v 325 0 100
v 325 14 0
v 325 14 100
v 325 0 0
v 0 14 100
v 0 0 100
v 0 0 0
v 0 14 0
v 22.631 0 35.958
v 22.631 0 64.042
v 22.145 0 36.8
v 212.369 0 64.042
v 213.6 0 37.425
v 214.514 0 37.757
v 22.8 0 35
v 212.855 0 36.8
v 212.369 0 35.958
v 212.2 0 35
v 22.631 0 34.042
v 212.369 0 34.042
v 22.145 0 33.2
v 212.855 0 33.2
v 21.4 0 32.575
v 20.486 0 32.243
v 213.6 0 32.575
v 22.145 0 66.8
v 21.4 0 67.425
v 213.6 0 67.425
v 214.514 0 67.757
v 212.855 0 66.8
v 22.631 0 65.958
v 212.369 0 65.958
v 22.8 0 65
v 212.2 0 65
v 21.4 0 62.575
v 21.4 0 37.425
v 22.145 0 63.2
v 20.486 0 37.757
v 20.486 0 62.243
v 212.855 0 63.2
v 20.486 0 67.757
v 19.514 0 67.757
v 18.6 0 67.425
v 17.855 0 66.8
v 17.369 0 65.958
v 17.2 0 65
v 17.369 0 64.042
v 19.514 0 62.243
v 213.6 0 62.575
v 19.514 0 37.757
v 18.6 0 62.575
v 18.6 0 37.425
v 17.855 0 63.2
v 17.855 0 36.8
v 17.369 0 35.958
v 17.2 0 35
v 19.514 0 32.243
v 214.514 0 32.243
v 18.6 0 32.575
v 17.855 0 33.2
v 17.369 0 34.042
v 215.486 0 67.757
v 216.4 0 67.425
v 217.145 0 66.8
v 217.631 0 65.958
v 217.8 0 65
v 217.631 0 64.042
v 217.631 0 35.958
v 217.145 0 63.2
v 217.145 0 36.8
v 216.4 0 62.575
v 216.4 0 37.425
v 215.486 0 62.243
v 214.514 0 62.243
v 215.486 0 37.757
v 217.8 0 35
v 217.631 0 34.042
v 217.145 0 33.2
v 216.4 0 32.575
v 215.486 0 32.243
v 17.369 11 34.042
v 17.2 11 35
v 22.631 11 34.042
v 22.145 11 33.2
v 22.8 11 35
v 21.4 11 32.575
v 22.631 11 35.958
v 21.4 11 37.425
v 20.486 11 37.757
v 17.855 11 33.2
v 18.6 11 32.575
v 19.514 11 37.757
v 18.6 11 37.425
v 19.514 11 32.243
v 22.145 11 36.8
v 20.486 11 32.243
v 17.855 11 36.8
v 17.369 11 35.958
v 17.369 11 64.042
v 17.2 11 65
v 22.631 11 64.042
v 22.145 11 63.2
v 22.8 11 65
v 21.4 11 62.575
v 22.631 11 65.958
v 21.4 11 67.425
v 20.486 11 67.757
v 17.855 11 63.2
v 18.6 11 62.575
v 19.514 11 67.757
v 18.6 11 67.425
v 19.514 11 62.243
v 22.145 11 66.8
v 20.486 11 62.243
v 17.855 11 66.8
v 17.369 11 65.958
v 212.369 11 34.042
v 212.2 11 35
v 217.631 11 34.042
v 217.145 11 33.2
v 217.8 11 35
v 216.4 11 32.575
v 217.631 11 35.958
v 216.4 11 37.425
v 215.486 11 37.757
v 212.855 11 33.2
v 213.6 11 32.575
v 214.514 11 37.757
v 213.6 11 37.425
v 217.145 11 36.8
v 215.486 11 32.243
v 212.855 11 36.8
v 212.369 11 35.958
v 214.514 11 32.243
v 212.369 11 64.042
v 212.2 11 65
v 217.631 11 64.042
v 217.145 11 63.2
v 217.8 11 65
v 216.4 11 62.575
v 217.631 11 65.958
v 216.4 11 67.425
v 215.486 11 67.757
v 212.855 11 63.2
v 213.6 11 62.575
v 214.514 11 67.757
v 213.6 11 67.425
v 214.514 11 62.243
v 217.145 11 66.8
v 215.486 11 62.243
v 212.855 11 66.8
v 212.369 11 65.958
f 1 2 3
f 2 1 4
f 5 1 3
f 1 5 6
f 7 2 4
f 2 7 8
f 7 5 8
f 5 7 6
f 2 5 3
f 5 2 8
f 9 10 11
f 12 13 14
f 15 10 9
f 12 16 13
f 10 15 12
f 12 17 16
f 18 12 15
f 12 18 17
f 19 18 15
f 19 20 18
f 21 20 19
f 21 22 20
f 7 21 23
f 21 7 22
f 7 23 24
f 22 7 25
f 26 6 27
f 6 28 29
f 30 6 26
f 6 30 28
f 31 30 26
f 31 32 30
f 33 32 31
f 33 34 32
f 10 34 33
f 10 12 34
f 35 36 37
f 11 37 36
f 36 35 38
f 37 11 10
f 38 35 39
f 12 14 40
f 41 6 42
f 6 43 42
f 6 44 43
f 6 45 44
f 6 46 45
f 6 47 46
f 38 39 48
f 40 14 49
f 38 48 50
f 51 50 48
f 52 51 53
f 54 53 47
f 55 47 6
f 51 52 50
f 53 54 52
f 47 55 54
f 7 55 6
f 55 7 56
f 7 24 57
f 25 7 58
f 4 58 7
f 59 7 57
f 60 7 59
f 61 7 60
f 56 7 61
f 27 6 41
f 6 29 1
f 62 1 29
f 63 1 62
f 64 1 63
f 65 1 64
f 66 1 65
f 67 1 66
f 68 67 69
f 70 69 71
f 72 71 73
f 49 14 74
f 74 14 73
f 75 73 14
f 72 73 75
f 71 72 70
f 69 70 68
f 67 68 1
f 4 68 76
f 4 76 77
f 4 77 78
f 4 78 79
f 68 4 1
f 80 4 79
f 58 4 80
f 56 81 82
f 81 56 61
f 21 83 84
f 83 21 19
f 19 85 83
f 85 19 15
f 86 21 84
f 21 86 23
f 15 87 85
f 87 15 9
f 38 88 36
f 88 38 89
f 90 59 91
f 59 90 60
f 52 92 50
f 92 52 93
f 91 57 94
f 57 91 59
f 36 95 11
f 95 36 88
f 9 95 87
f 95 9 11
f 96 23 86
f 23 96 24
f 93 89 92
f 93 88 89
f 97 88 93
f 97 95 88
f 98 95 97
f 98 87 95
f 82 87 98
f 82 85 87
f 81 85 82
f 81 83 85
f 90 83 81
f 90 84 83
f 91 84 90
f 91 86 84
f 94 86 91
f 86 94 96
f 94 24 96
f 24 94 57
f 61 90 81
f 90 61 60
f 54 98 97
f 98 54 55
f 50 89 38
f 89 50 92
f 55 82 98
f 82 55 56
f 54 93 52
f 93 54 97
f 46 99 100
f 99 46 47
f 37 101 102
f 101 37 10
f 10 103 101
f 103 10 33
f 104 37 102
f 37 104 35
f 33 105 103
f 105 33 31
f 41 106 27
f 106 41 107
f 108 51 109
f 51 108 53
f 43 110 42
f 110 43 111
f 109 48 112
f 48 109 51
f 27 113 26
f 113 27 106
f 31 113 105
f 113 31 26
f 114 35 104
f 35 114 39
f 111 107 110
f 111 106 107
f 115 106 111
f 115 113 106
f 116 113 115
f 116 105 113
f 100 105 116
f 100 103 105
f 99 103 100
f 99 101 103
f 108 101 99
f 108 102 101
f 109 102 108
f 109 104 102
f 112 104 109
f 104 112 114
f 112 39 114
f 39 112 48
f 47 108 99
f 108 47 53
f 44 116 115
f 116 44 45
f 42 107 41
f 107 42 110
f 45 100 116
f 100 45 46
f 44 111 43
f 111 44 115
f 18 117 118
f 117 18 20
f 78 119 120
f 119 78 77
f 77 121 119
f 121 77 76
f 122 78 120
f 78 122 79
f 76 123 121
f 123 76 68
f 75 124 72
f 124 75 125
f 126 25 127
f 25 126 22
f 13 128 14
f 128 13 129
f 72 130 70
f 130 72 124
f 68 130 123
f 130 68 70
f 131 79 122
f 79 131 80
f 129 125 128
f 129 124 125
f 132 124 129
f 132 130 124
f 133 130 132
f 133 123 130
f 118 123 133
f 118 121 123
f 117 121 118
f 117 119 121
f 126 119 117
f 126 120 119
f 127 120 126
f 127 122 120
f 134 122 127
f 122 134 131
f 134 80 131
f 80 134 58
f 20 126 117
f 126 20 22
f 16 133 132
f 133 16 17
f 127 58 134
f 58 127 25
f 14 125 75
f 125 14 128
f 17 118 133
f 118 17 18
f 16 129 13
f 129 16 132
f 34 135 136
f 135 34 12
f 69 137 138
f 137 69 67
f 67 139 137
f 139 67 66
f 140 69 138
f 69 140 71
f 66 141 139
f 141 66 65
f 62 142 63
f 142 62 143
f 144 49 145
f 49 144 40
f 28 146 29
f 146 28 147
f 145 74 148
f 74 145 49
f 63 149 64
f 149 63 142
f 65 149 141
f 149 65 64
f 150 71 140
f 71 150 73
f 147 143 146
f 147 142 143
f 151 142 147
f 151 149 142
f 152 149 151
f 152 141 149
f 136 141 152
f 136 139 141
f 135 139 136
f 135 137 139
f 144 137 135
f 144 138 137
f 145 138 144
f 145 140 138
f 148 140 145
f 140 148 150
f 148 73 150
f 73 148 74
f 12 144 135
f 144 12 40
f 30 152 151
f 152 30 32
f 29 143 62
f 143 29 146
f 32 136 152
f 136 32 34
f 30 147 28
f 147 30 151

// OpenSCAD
// file: mount_ring_module.scad
// rodi-stand/mount_ring_module.scad
// Shared RO/DI mount ring modules.

module wedge() {
  wedge_radius = mount_ring_outer_diameter + 1;
  rotate([0, 0, -90 - mount_opening_angle / 2])
  translate([0, 0, -1])
    linear_extrude(height = mount_ring_height + 2) {
      polygon(points = [
        [0, 0],
        [wedge_radius, 0],
        [cos(mount_opening_angle) * wedge_radius, sin(mount_opening_angle) * wedge_radius]
      ]);
    }
}

module screw_cutout() {
  translate([0, 0, mount_ring_height / 2])
  rotate([-90, 0, 0])
  union() {
    cylinder(mount_ring_inner_diameter / 2 + mount_surface_extension + 1, screw_hole_diameter / 2, screw_hole_diameter / 2);
    cylinder(mount_ring_inner_diameter / 2 + mount_surface_extension - screw_wall_width, screw_access_diameter / 2, screw_access_diameter / 2);
  }
}

module mount_ring() {
  difference() {
    union() {
      translate([-mount_surface_width / 2, 0, 0])
        cube([mount_surface_width, mount_ring_inner_diameter / 2 + mount_surface_extension, mount_ring_height]);
      cylinder(mount_ring_height, mount_ring_outer_diameter / 2, mount_ring_outer_diameter / 2);
    };
    translate([0, 0, -1])
      cylinder(mount_ring_height + 2, mount_ring_inner_diameter / 2, mount_ring_inner_diameter / 2);
    wedge();
    translate([screw_spacing / 2, 0, 0])
      screw_cutout();
    translate([-screw_spacing / 2, 0, 0])
      screw_cutout();
  }
}
// main file
// RO/DI Water Filter Stand
// Designed for 3D printing on a 256x256x256 mm build plate

use <mount_ring_module.scad>;

// ---------- Public parameters (mm) ----------
// Base dimensions (full build plate).
base_width = 250;
base_depth = 250;
base_thickness = 15;
base_front_corner_cut = 25;
base_back_corner_cut = 50;

// Mounting surface dimensions (shared by stand and mount plates).
mount_width = 100; // Width of the mounting surface.
mount_height = 200; // Height of mounting surface (adjustable).
base_glueing_surface_thickness = 6; // Thickness of mounting surface on the base.

// Screw parameters (shared by mount ring and mount plates).
screw_spacing = 30; // Horizontal spacing between screw holes.

// Stand positioning.
stand_offset_from_back = 40; // Distance from back edge of base.
stand_position_x = base_width / 2; // Center of base width-wise.

// Honeycomb pattern parameters.
honeycomb_width = 34;
honeycomb_margin = 40; // Margin from front and side edges of base.
honeycomb_back_margin = 80; // Distance from back edge - keeps back solid for stand mounting.

// Reinforcement gusset dimensions (optional - set to 0 to disable).
gusset_depth = 40; // Forward extension from mounting surface.
gusset_thickness = 6; // Thickness of gussets.
top_surface_angle = 45; // Angle of the top surface in degrees (0 = flat, positive = angled back).

// Mount ring parameters.
mount_ring_outer_diameter = 68;
mount_ring_inner_diameter = 60.5;
mount_ring_height = 20;
mount_surface_width = 65;
mount_surface_extension = 20;
mount_opening_angle = 120;
screw_wall_width = 12;
screw_hole_diameter = 4.5; // Mount ring screw hole diameter.
screw_access_diameter = 10;

// ---------- Resolution ----------
$fa = 1;
$fs = 1;

// ---------- Derived ----------
honeycomb_radius = (honeycomb_width / 2) / cos(30); // Radius of each hexagon (circumradius - distance from center to vertex).

// Calculate stand position.
stand_x = stand_position_x;
stand_y = base_depth - stand_offset_from_back - base_glueing_surface_thickness / 2;

module hexagon(radius) {
    // Create a regular hexagon
    // radius is the distance from center to vertex
    rotate([0, 0, 30])
    linear_extrude(height = base_thickness + 1) {
        circle(radius, $fn = 6);
    }
}

module honeycomb_pattern() {
    // Generate a tight honeycomb pattern where hexagons touch (like infill)
    // Hexagons are offset in alternating rows for true honeycomb pattern
    // For touching hexagons: horizontal spacing = radius * sqrt(3), vertical = radius * 1.5
    hex_apothem = honeycomb_radius * sqrt(3) / 2; // Distance from center to edge
    hex_horizontal_spacing = honeycomb_radius * sqrt(3); // Center-to-center horizontal (same row)
    hex_vertical_spacing = honeycomb_radius * 1.5; // Center-to-center vertical (adjacent rows)
    hex_row_offset = honeycomb_radius * sqrt(3) / 2; // Horizontal offset for alternating rows
    
    // Calculate pattern area (only front portion, not near back where stand mounts)
    pattern_width = base_width - 2 * honeycomb_margin;
    pattern_depth = base_depth - honeycomb_margin - honeycomb_back_margin; // Only front portion
    
    // Calculate how many hexagons fit
    num_cols = floor(pattern_width / hex_horizontal_spacing) + 2; // Extra columns for offset rows
    num_rows = floor(pattern_depth / hex_vertical_spacing) + 1;
    
    // Start position (front and centered)
    start_x = honeycomb_margin;
    start_y = honeycomb_margin;
    
    // Generate hexagons in honeycomb pattern (only in front area)
    for (row = [0 : num_rows - 1]) {
        y_pos = start_y + row * hex_vertical_spacing;
        // Only generate rows that are in the front area
        if (y_pos <= base_depth - honeycomb_back_margin) {
            // Offset every other row for honeycomb pattern
            x_offset = (row % 2 == 0) ? 0 : hex_row_offset;
            for (col = [0 : num_cols - 1]) {
                x_pos = start_x + col * hex_horizontal_spacing + x_offset;
                // Only create hexagon if it's within the horizontal bounds
                if (x_pos >= honeycomb_margin && x_pos <= base_width - honeycomb_margin) {
                    translate([x_pos, y_pos, -0.5])
                        hexagon(honeycomb_radius * 0.8);
                }
            }
        }
    }
}

module base() {
    // Base as a full square with honeycomb pattern cut from the middle
    difference() {
        // Full square base as extruded polygon (ready for rounded corners later)
        linear_extrude(height = base_thickness) {
            polygon(points = [
                [0, base_front_corner_cut], // Front left corner
                [base_front_corner_cut, 0],  // Front left corner
                [base_width - base_front_corner_cut, 0],              // Front right corner
                [base_width, base_front_corner_cut],              // Front right corner
                [base_width, base_depth - base_back_corner_cut],     // Back right corner
                [base_width - base_back_corner_cut, base_depth],     // Back right corner
                [base_back_corner_cut, base_depth],              // Back left corner
                [0, base_depth - base_back_corner_cut]              // Back left corner
            ]);
        }
        
        // Cut honeycomb pattern from the middle
        honeycomb_pattern();
    }
}

module angled_top_cut() {
    // Cut angled top surface using a rotated cube
    // Create cube, rotate around X axis, then translate along Z axis
    translate([0, -base_glueing_surface_thickness / 2, mount_height])
        rotate([-top_surface_angle, 0, 0])
            translate([-mount_width, -gusset_depth, 0])
                cube([mount_width * 2, gusset_depth * 3, gusset_depth * 3]);
}

module mounting_stand() {
    // Create the gluing surface and gussets as cubes at origin
    // Geometry is created with back edge at Y=0, centered at X=0, starting at Z=0
    difference() {
        union() {
            // Mounting surface (flat wall-like surface on base - mount plate glues to this)
            // Positioned so back edge is at Y=0, centered at X=0
            translate([-mount_width / 2, -base_glueing_surface_thickness / 2, 0])
                cube([mount_width, base_glueing_surface_thickness, mount_height]);
            
            // Reinforcement gussets on both sides of the mounting surface
            // Gussets are simple cubes extending forward from the mounting surface
            if (gusset_thickness > 0) {
                // Left gusset - extends forward from left edge of mounting surface
                translate([-mount_width / 2, -base_glueing_surface_thickness / 2, 0])
                    cube([gusset_thickness, gusset_depth + base_glueing_surface_thickness, mount_height]);
                
                // Right gusset - extends forward from right edge of mounting surface
                translate([mount_width / 2 - gusset_thickness, -base_glueing_surface_thickness / 2, 0])
                    cube([gusset_thickness, gusset_depth + base_glueing_surface_thickness, mount_height]);
            }
        }
        
        // Cut angled top surface
        angled_top_cut();
    }
}

module stand() {
    base();
    // Translate mounting stand to correct position
    translate([stand_x, stand_y, base_thickness])
        mounting_stand();
}

// ============================================================================
// Mount Ring - for mounting RO/DI unit
// ============================================================================


// ============================================================================
// Mount Plates - extend mounting surface height beyond build plate limits
// ============================================================================

// Mount plate parameters
plate_insert_diameter = 5.6; // Mount plate screw hole diameter (different from mount ring)
plate_insert_depth = 11;
plate_insert_back_wall_thickness = 3;
mount_thickness = plate_insert_depth + plate_insert_back_wall_thickness; // Thickness of the mount plate (separate part that glues to base)
plate_screw_hole_vertical_spacing = 195;
plate_screw_bottom_hole_spacing = 110;
plate_screw_hole_top_spacing = 20;

module plate_screw_hole(hole_diameter) {
    translate([0, -plate_insert_back_wall_thickness, 0])
    rotate([-90, 0, 0])
    cylinder(mount_thickness, hole_diameter / 2, hole_diameter / 2);
}

module mount_plate() {
    // Mount plate module
    // When printed on its side, this will have:
    // - Height (Z): mount_thickness (10mm) - layers will be vertical in final assembly
    // - Width (Y): mount_width (100mm) - matches stand mounting surface
    // - Length (X): length parameter
    // 
    // For printing: rotate 90° around X axis to lay on its side, then 45° around Z for diagonal
    difference() {
        cube([plate_screw_hole_top_spacing + plate_screw_bottom_hole_spacing + plate_screw_hole_vertical_spacing, mount_thickness, mount_width]);
        translate([plate_screw_hole_top_spacing, 0, mount_width / 2 - screw_spacing / 2])
            plate_screw_hole(plate_insert_diameter);
        translate([plate_screw_hole_top_spacing, 0, mount_width / 2 + screw_spacing / 2])
            plate_screw_hole(plate_insert_diameter);
        translate([plate_screw_hole_top_spacing + plate_screw_hole_vertical_spacing, 0, mount_width / 2 - screw_spacing / 2])
            plate_screw_hole(plate_insert_diameter);
        translate([plate_screw_hole_top_spacing + plate_screw_hole_vertical_spacing, 0, mount_width / 2 + screw_spacing / 2])
            plate_screw_hole(plate_insert_diameter);
    }
}

module test_mount_plate() {
    // Mount plate module
    // When printed on its side, this will have:
    // - Height (Z): mount_thickness (10mm) - layers will be vertical in final assembly
    // - Width (Y): mount_width (100mm) - matches stand mounting surface
    // - Length (X): length parameter
    // 
    // For printing: rotate 90° around X axis to lay on its side, then 45° around Z for diagonal
    difference() {
        cube([plate_screw_hole_top_spacing * 2, mount_thickness, mount_width]);
        translate([plate_screw_hole_top_spacing, 0, mount_width / 2 - screw_spacing / 2])
            plate_screw_hole(plate_insert_diameter);
        translate([plate_screw_hole_top_spacing, 0, mount_width / 2 + screw_spacing / 2])
            plate_screw_hole(plate_insert_diameter);
    }
}

// ============================================================================
// Main render - uncomment what you want to print
// ============================================================================

//stand();
//mount_ring();
mount_plate();
//test_mount_plate();
//mounting_stand();
//angled_top_cut();
